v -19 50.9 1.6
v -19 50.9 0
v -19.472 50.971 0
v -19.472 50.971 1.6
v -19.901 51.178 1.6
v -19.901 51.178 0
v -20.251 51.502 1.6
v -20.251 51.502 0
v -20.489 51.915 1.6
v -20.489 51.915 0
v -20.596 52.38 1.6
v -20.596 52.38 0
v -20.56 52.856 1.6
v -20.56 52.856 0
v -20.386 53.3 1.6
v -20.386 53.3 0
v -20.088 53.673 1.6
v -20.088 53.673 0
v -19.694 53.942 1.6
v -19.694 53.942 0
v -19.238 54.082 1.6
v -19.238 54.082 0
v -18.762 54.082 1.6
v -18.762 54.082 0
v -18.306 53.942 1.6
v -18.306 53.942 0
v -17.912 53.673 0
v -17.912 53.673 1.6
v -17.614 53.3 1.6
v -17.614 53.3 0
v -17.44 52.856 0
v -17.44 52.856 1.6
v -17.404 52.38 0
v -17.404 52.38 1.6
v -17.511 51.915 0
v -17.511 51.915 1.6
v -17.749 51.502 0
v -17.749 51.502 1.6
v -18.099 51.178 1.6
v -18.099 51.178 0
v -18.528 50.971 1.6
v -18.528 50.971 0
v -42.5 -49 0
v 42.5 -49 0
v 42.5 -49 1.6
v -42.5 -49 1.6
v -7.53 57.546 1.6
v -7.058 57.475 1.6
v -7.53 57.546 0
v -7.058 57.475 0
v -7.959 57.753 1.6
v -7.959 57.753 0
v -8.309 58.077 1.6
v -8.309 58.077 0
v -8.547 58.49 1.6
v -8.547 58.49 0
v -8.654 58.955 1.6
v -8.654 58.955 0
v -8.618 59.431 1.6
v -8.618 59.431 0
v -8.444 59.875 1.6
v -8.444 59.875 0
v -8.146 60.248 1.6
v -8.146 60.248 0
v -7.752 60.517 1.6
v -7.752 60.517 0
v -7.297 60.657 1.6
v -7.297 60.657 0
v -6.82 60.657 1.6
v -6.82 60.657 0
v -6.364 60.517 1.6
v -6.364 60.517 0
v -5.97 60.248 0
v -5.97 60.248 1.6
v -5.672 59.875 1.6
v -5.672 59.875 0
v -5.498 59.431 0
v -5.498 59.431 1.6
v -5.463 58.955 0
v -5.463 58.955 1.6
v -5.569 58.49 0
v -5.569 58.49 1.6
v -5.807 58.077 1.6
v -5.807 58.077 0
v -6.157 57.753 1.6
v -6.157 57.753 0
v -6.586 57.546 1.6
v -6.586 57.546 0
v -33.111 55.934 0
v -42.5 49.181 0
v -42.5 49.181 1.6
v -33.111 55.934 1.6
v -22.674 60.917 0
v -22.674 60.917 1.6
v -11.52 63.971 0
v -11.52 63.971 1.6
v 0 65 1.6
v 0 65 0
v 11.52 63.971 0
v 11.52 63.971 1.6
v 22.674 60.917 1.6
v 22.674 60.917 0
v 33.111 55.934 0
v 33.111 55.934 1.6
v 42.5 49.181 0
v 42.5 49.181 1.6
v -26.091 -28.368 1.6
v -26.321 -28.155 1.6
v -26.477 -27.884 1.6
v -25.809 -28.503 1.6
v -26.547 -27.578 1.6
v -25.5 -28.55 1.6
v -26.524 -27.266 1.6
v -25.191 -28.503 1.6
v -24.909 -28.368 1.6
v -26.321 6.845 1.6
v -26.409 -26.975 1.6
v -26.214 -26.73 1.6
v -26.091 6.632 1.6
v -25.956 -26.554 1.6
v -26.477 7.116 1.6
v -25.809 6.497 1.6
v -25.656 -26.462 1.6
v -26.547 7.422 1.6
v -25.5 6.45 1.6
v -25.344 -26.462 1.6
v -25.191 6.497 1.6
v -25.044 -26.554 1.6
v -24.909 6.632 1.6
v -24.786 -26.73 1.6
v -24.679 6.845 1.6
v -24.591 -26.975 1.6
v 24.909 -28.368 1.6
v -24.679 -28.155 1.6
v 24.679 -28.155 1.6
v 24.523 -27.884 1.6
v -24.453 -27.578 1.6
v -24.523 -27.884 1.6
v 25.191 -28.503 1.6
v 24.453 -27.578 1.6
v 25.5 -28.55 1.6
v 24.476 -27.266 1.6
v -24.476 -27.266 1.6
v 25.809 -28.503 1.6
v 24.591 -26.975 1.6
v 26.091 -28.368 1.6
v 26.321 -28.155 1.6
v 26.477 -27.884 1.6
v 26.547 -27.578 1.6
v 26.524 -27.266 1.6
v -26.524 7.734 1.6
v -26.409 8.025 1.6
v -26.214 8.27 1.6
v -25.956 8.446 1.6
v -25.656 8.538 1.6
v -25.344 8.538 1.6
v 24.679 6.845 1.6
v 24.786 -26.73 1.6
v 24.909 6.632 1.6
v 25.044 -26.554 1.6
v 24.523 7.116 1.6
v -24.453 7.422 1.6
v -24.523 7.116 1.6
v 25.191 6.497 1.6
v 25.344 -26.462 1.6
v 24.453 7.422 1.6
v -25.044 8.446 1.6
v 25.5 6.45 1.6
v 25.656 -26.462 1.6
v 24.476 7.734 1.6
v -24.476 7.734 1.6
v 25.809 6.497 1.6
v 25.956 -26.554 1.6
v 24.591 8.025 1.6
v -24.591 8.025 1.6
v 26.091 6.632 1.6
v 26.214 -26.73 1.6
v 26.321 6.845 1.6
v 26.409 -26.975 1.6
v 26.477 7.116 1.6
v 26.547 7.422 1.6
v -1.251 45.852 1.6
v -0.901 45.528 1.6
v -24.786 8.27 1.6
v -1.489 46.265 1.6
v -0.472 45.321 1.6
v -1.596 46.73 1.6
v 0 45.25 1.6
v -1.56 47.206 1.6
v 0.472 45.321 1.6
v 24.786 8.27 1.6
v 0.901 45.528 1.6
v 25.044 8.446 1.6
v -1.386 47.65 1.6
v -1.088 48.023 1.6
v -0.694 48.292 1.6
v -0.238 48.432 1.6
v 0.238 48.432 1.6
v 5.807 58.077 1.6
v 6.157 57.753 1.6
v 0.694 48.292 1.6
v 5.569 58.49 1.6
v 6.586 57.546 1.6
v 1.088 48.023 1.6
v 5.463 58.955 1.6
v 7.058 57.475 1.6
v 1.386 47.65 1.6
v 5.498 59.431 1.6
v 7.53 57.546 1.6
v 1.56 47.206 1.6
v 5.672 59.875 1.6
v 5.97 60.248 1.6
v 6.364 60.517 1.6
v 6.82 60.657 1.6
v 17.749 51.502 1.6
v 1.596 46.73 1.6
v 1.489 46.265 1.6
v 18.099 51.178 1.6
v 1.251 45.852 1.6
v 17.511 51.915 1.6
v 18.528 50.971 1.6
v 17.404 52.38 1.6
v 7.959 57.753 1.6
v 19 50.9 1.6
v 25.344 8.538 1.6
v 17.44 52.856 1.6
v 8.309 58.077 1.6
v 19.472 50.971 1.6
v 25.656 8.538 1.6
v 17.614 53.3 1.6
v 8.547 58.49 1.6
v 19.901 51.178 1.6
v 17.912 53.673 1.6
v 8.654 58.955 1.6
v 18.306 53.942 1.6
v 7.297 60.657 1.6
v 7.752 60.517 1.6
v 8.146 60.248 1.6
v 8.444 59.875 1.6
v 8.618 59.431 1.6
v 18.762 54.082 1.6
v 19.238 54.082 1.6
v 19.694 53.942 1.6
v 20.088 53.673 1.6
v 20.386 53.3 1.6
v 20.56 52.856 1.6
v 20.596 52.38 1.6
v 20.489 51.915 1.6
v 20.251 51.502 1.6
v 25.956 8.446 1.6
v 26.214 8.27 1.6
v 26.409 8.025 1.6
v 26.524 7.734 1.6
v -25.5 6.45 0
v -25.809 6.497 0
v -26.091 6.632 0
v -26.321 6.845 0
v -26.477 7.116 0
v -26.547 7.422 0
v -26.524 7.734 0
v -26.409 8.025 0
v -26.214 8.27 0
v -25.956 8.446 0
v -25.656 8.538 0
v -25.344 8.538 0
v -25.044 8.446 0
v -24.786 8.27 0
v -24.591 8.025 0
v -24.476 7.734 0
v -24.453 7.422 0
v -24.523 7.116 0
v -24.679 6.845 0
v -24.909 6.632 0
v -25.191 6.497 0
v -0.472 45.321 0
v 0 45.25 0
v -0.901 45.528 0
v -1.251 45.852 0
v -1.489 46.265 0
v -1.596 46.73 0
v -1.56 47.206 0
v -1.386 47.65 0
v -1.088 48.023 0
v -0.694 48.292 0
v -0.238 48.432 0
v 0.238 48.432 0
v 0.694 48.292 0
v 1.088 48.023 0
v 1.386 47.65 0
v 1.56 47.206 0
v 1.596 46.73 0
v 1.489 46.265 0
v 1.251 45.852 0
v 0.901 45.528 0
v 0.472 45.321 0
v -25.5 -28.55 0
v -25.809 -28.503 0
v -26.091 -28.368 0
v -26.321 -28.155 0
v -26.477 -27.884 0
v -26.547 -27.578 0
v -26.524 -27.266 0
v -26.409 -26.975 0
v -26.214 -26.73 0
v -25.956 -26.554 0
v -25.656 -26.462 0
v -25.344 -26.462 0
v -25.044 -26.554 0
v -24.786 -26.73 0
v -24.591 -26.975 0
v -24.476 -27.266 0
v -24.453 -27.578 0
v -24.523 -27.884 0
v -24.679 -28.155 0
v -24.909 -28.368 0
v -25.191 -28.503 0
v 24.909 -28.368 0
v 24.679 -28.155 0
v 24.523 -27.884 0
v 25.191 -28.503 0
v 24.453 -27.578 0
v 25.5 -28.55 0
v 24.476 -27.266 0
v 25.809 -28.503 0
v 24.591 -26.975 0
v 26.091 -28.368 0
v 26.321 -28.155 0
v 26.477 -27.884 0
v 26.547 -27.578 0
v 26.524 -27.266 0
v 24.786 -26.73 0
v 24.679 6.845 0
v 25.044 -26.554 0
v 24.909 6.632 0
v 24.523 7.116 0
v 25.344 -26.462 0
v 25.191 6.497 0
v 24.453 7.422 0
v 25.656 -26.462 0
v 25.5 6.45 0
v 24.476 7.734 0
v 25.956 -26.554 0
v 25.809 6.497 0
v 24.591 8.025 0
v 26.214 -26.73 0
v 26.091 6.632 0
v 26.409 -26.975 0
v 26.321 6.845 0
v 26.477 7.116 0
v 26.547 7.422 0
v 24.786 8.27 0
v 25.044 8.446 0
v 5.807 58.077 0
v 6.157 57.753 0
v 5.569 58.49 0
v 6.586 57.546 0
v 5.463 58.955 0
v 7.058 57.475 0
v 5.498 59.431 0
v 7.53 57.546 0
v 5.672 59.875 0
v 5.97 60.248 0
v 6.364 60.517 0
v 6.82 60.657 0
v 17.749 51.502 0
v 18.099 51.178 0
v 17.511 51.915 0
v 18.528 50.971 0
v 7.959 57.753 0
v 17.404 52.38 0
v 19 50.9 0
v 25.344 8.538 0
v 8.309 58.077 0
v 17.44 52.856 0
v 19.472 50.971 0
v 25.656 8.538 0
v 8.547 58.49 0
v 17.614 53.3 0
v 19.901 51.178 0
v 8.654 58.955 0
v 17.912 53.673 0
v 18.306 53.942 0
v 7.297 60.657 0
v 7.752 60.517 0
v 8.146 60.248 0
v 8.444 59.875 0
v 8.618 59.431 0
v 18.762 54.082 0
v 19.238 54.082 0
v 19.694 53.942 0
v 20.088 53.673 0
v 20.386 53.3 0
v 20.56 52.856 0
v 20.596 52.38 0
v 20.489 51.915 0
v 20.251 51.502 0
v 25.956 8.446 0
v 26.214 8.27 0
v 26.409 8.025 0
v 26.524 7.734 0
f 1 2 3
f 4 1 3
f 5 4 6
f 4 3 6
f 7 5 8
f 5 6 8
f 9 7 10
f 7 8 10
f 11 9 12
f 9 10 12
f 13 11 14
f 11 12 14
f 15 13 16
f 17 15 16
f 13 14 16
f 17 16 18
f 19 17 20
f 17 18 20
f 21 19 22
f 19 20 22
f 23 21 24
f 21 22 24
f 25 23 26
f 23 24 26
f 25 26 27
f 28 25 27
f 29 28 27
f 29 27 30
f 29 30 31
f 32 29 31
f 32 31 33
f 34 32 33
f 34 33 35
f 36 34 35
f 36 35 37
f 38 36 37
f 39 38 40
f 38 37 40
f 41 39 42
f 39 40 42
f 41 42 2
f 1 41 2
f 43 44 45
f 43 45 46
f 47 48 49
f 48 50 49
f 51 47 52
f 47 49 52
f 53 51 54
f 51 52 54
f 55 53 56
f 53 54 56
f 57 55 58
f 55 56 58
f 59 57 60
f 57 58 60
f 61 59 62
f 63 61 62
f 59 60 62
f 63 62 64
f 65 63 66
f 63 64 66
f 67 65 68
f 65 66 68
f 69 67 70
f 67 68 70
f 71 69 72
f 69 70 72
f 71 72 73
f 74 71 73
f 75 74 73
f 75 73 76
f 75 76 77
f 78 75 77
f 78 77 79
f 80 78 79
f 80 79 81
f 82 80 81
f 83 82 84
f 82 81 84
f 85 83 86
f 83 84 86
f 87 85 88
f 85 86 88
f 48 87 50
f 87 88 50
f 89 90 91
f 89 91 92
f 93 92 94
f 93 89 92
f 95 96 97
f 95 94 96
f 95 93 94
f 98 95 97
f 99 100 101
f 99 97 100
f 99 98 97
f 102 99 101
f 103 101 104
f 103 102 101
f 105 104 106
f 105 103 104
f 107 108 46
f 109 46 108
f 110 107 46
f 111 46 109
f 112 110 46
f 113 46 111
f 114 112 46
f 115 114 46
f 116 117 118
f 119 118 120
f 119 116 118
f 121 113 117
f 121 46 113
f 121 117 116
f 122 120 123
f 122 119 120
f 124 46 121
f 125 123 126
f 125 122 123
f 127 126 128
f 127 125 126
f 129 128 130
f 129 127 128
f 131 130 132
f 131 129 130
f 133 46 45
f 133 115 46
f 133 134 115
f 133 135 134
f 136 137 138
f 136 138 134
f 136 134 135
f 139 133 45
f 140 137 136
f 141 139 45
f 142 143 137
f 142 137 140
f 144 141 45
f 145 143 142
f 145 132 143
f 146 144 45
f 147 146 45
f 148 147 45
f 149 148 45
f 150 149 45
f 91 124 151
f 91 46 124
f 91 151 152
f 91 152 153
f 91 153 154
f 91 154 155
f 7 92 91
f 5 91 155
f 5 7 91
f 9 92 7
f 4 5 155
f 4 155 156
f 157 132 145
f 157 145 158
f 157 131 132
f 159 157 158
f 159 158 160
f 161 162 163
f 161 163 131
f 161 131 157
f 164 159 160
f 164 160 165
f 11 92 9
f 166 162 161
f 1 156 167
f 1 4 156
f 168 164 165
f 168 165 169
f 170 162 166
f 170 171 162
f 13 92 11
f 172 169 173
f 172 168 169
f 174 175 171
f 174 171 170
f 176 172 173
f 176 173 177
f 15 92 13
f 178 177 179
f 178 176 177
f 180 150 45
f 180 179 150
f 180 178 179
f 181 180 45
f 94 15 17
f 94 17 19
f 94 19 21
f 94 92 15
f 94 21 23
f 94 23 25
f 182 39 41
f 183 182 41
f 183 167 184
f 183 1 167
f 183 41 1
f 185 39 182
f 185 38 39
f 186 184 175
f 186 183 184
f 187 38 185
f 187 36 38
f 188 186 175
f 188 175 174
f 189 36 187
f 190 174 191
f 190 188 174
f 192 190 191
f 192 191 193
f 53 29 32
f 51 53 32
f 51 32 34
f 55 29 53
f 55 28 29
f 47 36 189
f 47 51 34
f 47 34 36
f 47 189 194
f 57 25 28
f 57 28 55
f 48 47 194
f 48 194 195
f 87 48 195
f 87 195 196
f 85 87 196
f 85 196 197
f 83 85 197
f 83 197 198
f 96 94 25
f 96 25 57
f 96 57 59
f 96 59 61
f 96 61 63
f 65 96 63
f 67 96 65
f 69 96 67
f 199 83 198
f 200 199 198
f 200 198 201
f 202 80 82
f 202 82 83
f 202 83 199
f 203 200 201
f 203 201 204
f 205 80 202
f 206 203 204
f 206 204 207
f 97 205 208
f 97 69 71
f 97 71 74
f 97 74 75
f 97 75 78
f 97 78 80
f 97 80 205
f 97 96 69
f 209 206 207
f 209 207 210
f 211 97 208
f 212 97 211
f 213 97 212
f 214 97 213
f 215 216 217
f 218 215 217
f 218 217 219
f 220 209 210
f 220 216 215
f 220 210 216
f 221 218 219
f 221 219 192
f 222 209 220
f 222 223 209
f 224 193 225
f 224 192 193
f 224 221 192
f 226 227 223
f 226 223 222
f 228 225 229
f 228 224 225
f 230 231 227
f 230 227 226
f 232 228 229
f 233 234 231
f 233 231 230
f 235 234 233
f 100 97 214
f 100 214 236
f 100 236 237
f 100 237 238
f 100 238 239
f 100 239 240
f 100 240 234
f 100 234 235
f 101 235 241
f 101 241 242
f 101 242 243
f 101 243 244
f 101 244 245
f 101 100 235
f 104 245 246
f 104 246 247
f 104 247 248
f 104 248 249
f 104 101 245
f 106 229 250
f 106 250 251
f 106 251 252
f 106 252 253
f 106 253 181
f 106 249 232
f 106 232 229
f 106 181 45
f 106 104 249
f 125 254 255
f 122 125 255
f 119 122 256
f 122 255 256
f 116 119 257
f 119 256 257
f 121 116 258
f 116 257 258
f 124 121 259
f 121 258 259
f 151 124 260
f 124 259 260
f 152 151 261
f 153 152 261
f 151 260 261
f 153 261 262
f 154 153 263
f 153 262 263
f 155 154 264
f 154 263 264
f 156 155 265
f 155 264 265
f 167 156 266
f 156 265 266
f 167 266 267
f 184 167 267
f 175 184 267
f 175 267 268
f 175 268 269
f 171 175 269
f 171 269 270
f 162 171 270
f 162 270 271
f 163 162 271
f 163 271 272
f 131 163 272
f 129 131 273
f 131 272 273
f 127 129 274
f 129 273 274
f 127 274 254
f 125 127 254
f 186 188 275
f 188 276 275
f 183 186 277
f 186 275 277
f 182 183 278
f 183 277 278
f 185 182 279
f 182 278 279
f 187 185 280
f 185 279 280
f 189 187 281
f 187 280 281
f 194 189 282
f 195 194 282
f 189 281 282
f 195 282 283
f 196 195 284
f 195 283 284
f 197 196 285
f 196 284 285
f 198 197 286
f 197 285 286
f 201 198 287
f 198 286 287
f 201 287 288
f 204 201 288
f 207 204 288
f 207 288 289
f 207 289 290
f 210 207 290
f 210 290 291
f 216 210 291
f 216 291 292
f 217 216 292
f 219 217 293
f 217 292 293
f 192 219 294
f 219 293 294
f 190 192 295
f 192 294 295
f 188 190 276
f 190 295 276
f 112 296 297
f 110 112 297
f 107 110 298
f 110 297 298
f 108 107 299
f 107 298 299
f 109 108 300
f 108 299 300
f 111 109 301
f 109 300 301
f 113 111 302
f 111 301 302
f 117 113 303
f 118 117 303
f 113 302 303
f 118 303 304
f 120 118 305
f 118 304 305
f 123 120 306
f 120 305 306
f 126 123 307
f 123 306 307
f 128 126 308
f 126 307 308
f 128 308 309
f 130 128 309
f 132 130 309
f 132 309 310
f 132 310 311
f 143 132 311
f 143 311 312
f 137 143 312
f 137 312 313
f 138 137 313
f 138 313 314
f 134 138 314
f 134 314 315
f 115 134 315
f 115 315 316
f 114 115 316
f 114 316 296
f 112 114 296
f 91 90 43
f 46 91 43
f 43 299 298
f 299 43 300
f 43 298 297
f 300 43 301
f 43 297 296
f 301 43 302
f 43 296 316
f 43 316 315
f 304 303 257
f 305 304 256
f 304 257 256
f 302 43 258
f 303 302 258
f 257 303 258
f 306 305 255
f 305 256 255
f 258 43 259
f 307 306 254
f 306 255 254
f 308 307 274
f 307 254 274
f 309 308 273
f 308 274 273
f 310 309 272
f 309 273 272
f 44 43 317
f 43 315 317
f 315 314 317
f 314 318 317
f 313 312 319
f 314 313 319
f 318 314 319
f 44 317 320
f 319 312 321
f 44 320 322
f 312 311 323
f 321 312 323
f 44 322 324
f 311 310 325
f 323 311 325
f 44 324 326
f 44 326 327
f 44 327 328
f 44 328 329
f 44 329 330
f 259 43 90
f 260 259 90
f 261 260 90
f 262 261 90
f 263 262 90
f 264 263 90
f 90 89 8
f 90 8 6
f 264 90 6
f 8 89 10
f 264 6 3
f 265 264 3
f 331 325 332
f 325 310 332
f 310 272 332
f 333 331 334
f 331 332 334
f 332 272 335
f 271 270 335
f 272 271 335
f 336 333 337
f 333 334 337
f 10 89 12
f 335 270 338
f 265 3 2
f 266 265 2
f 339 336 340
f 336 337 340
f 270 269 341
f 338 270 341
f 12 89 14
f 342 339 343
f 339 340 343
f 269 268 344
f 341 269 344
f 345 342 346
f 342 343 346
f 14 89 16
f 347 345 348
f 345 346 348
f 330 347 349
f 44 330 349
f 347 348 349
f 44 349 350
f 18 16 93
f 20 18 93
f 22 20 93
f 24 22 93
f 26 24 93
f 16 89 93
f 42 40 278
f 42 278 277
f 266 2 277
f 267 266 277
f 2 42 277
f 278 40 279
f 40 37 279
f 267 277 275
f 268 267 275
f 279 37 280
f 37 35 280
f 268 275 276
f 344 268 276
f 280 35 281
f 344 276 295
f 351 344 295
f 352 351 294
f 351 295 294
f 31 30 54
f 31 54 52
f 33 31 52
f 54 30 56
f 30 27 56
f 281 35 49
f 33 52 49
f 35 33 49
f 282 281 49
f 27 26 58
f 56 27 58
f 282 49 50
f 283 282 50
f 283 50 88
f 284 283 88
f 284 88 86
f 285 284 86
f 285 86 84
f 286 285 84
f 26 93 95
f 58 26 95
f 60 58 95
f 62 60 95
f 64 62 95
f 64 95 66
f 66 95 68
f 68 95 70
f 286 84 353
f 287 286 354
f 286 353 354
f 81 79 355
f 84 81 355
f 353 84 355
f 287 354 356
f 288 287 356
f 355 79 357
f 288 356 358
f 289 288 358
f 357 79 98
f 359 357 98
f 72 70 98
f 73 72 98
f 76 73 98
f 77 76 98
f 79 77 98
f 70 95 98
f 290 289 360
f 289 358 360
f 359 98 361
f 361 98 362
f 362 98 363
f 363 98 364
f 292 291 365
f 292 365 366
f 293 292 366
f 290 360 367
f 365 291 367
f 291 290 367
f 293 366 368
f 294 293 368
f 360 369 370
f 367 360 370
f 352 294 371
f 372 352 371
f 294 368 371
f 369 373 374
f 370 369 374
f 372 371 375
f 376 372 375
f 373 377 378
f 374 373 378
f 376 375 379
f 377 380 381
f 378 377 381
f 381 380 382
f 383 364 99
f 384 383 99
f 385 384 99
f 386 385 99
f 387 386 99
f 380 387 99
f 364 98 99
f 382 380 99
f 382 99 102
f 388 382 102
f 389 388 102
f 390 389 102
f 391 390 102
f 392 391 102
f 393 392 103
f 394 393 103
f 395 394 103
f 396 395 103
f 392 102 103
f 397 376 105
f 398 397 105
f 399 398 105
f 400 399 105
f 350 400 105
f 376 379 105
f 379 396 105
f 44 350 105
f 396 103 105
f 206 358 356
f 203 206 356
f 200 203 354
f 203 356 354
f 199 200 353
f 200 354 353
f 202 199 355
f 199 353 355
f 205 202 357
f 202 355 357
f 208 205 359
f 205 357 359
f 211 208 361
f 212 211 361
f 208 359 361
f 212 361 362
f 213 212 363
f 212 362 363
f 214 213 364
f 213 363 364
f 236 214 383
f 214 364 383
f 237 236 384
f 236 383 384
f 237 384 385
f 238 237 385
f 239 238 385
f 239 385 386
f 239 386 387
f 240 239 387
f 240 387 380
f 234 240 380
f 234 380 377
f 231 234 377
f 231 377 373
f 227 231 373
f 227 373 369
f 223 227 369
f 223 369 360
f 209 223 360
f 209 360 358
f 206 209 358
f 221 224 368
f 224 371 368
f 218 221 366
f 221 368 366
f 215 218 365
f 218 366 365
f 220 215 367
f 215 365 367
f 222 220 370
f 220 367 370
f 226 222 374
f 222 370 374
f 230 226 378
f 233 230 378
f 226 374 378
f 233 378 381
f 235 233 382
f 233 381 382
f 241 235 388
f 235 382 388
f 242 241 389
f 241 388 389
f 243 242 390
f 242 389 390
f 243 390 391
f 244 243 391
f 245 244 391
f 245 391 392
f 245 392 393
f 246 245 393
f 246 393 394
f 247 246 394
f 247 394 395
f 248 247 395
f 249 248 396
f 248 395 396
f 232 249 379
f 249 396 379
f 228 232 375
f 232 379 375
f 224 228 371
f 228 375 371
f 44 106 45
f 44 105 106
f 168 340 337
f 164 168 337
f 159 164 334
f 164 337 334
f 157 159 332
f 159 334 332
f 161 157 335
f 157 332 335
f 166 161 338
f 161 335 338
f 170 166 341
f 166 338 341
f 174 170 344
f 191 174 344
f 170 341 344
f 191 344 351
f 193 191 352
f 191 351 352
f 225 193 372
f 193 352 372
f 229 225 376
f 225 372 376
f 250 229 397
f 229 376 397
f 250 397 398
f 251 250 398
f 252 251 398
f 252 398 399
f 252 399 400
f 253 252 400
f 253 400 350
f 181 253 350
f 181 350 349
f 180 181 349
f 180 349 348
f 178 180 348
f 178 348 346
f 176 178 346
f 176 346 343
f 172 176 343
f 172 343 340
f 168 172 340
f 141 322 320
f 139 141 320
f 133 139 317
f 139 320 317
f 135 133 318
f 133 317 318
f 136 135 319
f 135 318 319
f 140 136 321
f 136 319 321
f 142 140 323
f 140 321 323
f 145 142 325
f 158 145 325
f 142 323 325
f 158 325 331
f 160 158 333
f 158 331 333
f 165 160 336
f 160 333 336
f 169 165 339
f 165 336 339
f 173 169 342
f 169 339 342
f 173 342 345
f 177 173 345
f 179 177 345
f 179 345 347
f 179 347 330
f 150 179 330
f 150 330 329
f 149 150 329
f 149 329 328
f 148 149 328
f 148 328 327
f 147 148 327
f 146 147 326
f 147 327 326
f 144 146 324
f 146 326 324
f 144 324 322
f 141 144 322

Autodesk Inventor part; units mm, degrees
ref_plane "YZ Plane" through (0, 0, 0) normal (1, 0, 0) x (0, 1, 0)
ref_plane "XZ Plane" through (0, 0, 0) normal (0, 1, 0) x (-1, 0, 0)
ref_plane "XY Plane" through (0, 0, 0) normal (0, 0, 1) x (1, 0, 0)
sketch "スケッチ1" plane through (0, 0, 0) normal (0, 0, 1) x (1, 0, 0)
  circle A0 centre (0, 0) radius 65 construction
  line L0 (-42.5, 65) -> (42.5, 65) construction
  line L1 (42.5, 65) -> (42.5, -65) construction
  line L2 (42.5, -65) -> (-42.5, -65) construction
  line L3 (-42.5, -65) -> (-42.5, 65) construction
  arc A1 (42.5, 49.1808) -> (-42.5, 49.1808) centre (0, 0) ccw
  line L4 (-42.5, 49.1808) -> (-42.5, -49.1808)
  line L5 (42.5, 49.1808) -> (42.5, -49.1808)
  arc A2 (-42.5, -49.1808) -> (42.5, -49.1808) centre (0, 0) ccw
  line L6 (42.5, -49) -> (-42.5, -49)
  point P0 (0, 65)
  dimension "d0" = 130
  dimension "d1" = 85
  dimension "d41" = 49
extrude "基板" add sketch "スケッチ1" along normal blind 1.6 contours L5 L6 L4 A1
sketch "スケッチ2" plane through (0, 0, 1.6) normal (0, 0, 1) x (1, 0, 0)
  line L0 (0, 110.7931) -> (0, -110.7931) construction
  line L1 (-42.5, 49.1808) -> (-42.5, -49) construction
  line L2 (-63.4163, -10) -> (63.4163, -10) construction
  point P0 (0, 0)
  point P1 (0, 0)
  point P2 (0, 0)
  point P3 (-42.5, -49.1808)
  point P4 (-25.5, -27.5)
  point P5 (-25.5, 7.5)
  point P6 (25.5, -27.5)
  point P7 (25.5, 7.5)
  point P8 (0, -10)
  dimension "d38" = 35
  dimension "d39" = 17
  dimension "d40" = 10
hole "モータ取付穴" at (-25.5, -27.5, 1.6) at (-25.5, 7.5, 1.6) at (25.5, -27.5, 1.6) at (25.5, 7.5, 1.6) direction (0, 0, -1) diameter 2.1 end through all
sketch "スケッチ3" plane through (0, 0, 1.6) normal (0, 0, 1) x (1, 0, 0)
  line L0 (0, 0) -> (0, 55.332) construction
  line L1 (-15.38, 55) -> (15.38, 55) construction
  line L2 (0, 46.85) -> (-7.0581, 50.925) construction
  line L3 (-7.0581, 50.925) -> (-7.0581, 59.075) construction
  line L4 (-7.0581, 59.075) -> (0, 63.15) construction
  line L5 (0, 63.15) -> (7.0581, 59.075) construction
  line L6 (7.0581, 59.075) -> (7.0581, 50.925) construction
  line L7 (7.0581, 50.925) -> (0, 46.85) construction
  arc A0 (42.5, 49.1808) -> (-42.5, 49.1808) centre (0, 0) ccw construction
  point P0 (0, 55)
  point P1 (0, 55)
  point P2 (0, 65)
  dimension "d17" = 16.3
  dimension "d18" = 10
hole "ボールキャスター取付穴" at (-7.0581, 59.075, 1.6) at (7.0581, 59.075, 1.6) at (0, 46.85, 1.6) direction (0, 0, -1) diameter 3.2 end through all
sketch "スケッチ5" plane through (0, 0, 1.6) normal (0, 0, 1) x (1, 0, 0)
  line L0 (0, 0) -> (0, 96.0936) construction
  line L1 (-67.6385, -10) -> (77.8935, -10) construction
  point P0 (-19, 52.5)
  point P1 (19, 52.5)
  dimension "d42" = 38
  dimension "d43" = 10
  dimension "d44" = 62.5
hole "穴4" at (-19, 52.5, 1.6) at (19, 52.5, 1.6) direction (0, 0, -1) diameter 3.2 end through all
properties part number "BaseBoard2"
